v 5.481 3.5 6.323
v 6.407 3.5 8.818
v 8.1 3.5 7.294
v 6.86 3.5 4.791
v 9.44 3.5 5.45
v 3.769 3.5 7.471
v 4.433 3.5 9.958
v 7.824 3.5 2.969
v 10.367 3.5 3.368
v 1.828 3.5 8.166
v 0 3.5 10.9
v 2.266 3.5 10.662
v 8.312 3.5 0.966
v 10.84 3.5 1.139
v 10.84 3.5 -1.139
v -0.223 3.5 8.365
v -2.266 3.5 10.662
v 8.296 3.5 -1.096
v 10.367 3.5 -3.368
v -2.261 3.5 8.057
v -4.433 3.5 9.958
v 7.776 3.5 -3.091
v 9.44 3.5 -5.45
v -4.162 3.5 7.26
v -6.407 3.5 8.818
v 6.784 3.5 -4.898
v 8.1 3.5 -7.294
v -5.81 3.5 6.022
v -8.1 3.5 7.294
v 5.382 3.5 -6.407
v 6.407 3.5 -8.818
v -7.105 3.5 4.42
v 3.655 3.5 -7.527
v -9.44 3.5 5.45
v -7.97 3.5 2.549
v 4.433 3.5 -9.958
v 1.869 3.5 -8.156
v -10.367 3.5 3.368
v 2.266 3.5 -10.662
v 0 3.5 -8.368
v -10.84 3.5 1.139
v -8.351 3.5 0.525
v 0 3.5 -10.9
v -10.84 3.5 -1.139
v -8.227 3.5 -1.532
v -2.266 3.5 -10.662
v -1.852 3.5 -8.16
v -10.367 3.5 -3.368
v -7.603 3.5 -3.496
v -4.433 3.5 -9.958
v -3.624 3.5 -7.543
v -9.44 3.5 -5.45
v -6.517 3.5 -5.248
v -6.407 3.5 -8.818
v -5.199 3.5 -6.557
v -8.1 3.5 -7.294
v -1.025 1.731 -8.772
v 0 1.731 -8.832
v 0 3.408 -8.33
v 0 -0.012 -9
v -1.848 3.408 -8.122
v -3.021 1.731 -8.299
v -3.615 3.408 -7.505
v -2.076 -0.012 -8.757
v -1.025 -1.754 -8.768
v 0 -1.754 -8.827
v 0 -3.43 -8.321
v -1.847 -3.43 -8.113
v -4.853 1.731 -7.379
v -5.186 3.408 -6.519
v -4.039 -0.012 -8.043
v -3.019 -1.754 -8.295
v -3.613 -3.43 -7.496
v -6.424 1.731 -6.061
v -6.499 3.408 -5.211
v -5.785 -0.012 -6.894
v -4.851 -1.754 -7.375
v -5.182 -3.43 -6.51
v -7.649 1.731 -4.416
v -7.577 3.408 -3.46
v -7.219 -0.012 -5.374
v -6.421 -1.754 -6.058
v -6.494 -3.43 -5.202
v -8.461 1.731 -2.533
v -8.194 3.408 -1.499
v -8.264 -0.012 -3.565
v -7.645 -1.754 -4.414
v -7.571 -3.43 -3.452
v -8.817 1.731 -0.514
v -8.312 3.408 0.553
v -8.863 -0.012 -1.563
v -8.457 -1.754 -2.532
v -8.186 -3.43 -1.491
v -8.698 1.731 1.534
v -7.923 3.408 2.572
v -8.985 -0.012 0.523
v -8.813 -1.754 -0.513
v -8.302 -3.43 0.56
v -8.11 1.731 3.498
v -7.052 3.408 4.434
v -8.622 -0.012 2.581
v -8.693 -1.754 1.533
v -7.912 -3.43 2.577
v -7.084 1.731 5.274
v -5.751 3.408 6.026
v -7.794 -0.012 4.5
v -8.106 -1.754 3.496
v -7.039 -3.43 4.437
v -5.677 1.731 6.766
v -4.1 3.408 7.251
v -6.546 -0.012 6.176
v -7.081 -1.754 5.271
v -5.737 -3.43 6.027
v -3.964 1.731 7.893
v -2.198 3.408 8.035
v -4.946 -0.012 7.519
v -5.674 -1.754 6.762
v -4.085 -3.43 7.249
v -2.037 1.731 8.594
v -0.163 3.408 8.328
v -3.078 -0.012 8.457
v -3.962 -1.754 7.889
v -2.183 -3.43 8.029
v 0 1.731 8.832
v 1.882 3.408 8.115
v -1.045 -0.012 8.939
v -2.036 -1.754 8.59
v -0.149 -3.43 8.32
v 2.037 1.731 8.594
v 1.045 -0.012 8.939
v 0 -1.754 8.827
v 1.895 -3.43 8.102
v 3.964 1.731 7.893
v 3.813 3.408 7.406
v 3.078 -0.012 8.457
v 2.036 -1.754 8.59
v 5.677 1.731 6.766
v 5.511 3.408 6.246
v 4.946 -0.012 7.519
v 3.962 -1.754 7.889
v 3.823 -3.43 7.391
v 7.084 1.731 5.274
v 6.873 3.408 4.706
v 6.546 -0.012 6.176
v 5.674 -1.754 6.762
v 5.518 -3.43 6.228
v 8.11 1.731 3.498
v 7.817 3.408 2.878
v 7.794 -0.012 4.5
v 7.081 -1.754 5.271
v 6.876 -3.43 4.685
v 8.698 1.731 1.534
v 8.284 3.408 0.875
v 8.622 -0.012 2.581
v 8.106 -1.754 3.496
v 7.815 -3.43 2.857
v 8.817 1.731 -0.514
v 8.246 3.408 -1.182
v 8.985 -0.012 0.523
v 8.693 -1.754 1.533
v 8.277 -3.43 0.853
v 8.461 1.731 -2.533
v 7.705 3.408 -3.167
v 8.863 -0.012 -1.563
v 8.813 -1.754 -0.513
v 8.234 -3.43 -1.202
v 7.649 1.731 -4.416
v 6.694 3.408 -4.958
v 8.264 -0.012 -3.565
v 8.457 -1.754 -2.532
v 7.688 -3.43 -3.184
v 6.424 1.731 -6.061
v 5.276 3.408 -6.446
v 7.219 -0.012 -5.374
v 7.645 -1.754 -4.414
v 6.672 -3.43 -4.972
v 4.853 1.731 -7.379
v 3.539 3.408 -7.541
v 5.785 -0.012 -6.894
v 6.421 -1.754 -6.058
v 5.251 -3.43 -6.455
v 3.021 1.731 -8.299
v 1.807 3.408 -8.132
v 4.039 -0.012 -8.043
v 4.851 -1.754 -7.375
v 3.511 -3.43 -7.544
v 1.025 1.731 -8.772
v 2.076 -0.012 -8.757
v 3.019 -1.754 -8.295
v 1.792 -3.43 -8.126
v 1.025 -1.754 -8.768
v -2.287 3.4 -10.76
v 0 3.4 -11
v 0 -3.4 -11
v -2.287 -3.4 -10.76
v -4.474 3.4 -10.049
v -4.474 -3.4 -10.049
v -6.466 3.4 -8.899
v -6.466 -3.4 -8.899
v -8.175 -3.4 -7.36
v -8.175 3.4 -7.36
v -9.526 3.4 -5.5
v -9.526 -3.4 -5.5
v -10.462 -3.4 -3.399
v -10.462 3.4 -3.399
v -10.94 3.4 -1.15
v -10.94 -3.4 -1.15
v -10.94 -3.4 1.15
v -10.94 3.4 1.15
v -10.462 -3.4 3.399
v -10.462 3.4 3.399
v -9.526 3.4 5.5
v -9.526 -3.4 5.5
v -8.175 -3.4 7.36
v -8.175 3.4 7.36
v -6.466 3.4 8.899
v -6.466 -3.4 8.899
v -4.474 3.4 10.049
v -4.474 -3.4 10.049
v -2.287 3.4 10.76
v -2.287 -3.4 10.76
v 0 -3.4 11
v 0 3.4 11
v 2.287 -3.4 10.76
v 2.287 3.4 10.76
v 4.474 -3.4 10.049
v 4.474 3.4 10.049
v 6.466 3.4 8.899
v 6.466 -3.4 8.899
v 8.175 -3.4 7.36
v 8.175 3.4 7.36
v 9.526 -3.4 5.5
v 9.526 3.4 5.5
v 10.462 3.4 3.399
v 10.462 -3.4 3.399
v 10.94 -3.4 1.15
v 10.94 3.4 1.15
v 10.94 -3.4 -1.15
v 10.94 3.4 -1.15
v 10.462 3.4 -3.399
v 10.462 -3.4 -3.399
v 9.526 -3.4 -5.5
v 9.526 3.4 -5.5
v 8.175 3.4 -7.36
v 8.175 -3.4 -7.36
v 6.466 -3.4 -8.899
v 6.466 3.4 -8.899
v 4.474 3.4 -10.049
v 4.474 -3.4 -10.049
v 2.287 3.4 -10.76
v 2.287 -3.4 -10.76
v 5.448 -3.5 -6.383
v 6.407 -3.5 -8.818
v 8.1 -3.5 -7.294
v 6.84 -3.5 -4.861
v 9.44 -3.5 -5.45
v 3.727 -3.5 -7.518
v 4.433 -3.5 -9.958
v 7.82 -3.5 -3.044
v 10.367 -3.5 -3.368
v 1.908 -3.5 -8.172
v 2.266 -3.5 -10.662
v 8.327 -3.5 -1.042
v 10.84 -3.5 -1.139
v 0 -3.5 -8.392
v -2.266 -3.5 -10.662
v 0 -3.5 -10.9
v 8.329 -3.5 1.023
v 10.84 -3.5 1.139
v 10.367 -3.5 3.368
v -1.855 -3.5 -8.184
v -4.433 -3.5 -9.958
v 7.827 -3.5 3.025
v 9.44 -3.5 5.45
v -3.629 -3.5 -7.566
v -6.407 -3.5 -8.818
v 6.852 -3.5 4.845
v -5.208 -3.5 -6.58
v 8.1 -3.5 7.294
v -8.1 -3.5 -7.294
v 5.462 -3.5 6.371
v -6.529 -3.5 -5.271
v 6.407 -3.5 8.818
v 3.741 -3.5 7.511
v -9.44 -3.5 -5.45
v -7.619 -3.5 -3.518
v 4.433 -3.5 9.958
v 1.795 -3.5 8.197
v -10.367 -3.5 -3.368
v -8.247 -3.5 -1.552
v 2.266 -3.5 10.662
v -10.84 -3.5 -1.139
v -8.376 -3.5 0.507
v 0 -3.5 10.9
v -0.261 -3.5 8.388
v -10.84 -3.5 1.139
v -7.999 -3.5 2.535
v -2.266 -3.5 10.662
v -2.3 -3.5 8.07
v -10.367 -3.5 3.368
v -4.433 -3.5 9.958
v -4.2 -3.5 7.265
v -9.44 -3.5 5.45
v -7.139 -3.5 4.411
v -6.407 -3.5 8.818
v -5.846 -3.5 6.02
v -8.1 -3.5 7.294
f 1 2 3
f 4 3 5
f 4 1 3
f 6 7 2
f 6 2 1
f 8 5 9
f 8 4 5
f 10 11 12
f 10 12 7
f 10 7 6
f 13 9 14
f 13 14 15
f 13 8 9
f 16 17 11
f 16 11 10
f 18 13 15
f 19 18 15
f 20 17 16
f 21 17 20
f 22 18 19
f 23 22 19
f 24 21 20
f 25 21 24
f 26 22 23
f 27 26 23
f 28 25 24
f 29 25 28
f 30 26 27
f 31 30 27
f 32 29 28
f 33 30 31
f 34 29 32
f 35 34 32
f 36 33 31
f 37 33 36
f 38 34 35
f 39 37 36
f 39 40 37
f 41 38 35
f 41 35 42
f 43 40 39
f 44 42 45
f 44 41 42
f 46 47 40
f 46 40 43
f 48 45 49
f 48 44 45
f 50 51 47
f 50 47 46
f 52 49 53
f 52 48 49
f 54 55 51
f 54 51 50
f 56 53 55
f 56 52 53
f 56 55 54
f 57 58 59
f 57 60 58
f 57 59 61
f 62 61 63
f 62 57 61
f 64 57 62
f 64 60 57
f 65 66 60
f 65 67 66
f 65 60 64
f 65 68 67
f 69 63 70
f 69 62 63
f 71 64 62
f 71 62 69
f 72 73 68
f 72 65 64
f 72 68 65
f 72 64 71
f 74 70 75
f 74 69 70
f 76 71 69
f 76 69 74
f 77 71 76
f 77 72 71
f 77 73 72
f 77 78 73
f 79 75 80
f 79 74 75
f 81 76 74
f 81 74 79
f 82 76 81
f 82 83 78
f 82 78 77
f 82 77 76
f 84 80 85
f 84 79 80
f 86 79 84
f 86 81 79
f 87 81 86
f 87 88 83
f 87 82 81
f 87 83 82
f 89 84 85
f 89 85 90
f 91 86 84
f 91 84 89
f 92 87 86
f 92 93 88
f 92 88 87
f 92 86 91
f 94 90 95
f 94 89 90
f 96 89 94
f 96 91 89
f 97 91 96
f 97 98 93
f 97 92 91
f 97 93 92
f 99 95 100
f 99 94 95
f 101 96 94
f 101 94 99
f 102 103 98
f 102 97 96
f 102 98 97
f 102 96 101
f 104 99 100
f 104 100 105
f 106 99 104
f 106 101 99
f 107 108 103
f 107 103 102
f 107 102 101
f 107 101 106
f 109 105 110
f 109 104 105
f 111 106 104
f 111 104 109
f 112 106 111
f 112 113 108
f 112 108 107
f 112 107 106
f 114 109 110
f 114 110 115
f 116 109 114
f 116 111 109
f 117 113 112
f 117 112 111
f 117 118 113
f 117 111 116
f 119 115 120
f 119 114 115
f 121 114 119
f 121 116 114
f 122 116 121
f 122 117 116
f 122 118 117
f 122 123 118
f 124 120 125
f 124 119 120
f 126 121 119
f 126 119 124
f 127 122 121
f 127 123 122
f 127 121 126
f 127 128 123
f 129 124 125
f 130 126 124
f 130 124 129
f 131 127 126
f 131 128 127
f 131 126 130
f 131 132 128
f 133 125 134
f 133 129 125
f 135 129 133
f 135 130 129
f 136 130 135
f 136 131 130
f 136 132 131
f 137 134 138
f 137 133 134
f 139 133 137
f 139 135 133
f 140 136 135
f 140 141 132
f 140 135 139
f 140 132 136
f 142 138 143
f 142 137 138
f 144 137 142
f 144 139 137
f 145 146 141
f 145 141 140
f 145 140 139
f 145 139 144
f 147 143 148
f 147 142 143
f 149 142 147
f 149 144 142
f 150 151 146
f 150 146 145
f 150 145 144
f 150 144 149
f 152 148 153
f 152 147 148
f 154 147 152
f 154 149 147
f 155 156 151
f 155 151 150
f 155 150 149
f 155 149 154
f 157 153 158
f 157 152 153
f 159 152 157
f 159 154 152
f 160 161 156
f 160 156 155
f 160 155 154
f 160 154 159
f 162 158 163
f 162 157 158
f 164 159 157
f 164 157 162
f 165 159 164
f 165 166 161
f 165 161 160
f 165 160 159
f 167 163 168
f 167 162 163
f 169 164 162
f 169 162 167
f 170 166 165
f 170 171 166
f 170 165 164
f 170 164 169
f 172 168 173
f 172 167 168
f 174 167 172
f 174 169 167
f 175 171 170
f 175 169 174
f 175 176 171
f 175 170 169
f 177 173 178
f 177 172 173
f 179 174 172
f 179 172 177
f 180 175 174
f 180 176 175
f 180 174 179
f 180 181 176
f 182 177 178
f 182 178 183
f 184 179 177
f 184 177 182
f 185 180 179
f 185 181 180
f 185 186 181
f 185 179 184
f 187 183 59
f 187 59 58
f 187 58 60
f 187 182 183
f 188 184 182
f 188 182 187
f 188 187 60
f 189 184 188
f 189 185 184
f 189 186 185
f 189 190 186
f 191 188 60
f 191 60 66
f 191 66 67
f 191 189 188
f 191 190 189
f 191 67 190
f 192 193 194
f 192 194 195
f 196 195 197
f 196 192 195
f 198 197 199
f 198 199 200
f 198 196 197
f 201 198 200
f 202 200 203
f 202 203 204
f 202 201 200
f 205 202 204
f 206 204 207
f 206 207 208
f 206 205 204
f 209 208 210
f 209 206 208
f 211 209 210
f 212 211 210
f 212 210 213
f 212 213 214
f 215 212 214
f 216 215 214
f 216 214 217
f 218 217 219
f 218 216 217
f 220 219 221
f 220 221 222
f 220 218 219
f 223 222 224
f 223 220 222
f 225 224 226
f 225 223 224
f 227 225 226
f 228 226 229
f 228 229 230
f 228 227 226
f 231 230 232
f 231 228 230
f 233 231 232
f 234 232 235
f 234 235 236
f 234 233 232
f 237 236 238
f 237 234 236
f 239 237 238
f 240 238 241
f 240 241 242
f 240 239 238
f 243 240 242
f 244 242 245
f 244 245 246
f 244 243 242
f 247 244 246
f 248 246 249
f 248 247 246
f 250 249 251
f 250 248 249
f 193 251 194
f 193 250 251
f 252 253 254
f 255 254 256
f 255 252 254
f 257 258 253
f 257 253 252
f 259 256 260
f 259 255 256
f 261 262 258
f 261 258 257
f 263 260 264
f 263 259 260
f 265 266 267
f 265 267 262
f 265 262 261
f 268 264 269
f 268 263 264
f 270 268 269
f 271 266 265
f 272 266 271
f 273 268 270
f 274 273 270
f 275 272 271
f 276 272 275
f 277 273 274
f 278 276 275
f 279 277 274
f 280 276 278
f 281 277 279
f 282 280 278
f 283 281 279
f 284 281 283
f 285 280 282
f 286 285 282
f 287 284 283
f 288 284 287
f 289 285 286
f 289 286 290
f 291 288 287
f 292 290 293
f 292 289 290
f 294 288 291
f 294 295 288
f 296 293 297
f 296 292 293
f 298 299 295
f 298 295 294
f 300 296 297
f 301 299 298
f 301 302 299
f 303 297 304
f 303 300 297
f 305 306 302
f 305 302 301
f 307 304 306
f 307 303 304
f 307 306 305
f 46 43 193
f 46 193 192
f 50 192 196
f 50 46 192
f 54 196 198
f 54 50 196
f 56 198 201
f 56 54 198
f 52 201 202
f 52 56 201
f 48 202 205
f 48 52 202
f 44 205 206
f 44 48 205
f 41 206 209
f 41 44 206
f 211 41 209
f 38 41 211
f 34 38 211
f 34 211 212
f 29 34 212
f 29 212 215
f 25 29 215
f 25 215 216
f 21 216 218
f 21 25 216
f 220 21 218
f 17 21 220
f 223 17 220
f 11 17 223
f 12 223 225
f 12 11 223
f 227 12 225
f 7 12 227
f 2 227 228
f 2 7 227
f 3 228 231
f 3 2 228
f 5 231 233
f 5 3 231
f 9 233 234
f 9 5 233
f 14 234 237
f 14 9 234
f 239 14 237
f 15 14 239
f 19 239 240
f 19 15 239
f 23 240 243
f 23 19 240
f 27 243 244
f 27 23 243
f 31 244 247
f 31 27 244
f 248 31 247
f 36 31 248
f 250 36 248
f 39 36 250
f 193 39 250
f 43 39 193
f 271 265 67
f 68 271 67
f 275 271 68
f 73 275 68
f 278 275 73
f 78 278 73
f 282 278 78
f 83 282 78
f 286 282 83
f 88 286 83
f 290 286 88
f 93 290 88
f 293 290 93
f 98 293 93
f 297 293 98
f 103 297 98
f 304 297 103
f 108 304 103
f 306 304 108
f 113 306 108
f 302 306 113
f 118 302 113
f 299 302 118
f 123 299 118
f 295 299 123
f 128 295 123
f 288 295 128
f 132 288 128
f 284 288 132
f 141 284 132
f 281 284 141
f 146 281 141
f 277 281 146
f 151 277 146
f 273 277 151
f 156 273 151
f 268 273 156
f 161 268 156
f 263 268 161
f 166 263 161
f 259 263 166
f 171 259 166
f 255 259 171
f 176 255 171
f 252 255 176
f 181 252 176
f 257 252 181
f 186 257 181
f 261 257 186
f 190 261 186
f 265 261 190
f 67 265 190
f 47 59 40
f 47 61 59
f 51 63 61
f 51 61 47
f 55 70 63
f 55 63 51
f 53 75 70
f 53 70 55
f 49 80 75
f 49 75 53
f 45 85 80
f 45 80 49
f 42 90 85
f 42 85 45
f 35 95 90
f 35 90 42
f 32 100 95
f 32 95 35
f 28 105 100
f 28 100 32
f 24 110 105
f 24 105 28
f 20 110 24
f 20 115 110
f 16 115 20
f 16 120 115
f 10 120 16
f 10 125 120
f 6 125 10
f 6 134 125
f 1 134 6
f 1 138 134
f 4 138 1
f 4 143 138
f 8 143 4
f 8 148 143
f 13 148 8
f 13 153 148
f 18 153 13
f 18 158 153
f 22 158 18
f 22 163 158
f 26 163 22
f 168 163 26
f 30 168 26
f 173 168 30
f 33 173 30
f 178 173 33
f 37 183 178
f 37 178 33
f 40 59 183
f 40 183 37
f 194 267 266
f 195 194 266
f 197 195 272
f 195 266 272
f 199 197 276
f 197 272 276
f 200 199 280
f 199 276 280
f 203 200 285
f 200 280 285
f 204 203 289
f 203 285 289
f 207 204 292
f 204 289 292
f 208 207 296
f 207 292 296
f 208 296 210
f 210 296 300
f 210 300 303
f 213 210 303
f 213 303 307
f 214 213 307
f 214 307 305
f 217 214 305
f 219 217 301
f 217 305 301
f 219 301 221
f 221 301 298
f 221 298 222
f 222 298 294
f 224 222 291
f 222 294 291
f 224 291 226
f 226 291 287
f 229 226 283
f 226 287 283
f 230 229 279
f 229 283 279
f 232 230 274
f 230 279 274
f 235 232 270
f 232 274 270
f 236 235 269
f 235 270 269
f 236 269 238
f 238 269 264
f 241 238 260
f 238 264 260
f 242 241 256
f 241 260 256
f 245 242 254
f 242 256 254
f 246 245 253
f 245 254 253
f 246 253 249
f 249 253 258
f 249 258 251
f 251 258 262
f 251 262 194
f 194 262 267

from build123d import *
from OCP.BRepFilletAPI import BRepFilletAPI_MakeChamfer

# Parameters (mm, degrees)
CHAMFER1_SIZE  = 0.1
CHAMFER1_SIZE2 = 0.076325766


with BuildPart() as part:
    # Sketch2 → Revolve1 (revolve)
    with BuildSketch(Plane.XY, mode=Mode.PRIVATE) as revolve1_sk:
        with BuildLine():
            Line((-11, -3.5), (-11, 3.5))
            Line((-11, 3.5), (-8.291561976, 3.5))
            ThreePointArc((-8.291561976, 3.5), (-9, 0), (-8.291561976, -3.5))
            Line((-8.291561976, -3.5), (-11, -3.5))
        make_face()
    revolve(revolve1_sk.sketch.rotate(Axis((0, 0, 0), (0, 1, 0)), 270), axis=Axis((0, 0, 0), (0, 1, 0)))

    # Chamfer1: one chamfer whose edges measure the first distance from different faces: ONE call of the kernel's chamfer builder (chamfer() names one face for all edges)
    chamfer1_edges_1 = [part.edges().sort_by_distance(p)[0] for p in [
        (0, 3.5, 8.291561976),
    ]]
    chamfer1_side_1 = [part.faces().sort_by_distance(p)[0] for p in [
        (0, 0, 9),
    ]]
    chamfer1_edges_2 = [part.edges().sort_by_distance(p)[0] for p in [
        (0, -3.5, 8.291561976),
    ]]
    chamfer1_side_2 = [part.faces().sort_by_distance(p)[0] for p in [
        (0, -3.5, 8.60268896),
    ]]
    chamfer1_edges_3 = [part.edges().sort_by_distance(p)[0] for p in [
        (0, -3.5, 11),
        (0, 3.5, 11),
    ]]
    chamfer1 = BRepFilletAPI_MakeChamfer(part.part.solid().wrapped)
    for e in chamfer1_edges_1:
        chamfer1.Add(CHAMFER1_SIZE, CHAMFER1_SIZE2, e.wrapped, chamfer1_side_1[0].wrapped)  # the first distance lies on this face
    for e in chamfer1_edges_2:
        chamfer1.Add(CHAMFER1_SIZE, CHAMFER1_SIZE2, e.wrapped, chamfer1_side_2[0].wrapped)  # the first distance lies on this face
    for e in chamfer1_edges_3:
        chamfer1.Add(CHAMFER1_SIZE, e.wrapped)
    add(Compound.cast(chamfer1.Shape()), mode=Mode.REPLACE)


solid = part.part
